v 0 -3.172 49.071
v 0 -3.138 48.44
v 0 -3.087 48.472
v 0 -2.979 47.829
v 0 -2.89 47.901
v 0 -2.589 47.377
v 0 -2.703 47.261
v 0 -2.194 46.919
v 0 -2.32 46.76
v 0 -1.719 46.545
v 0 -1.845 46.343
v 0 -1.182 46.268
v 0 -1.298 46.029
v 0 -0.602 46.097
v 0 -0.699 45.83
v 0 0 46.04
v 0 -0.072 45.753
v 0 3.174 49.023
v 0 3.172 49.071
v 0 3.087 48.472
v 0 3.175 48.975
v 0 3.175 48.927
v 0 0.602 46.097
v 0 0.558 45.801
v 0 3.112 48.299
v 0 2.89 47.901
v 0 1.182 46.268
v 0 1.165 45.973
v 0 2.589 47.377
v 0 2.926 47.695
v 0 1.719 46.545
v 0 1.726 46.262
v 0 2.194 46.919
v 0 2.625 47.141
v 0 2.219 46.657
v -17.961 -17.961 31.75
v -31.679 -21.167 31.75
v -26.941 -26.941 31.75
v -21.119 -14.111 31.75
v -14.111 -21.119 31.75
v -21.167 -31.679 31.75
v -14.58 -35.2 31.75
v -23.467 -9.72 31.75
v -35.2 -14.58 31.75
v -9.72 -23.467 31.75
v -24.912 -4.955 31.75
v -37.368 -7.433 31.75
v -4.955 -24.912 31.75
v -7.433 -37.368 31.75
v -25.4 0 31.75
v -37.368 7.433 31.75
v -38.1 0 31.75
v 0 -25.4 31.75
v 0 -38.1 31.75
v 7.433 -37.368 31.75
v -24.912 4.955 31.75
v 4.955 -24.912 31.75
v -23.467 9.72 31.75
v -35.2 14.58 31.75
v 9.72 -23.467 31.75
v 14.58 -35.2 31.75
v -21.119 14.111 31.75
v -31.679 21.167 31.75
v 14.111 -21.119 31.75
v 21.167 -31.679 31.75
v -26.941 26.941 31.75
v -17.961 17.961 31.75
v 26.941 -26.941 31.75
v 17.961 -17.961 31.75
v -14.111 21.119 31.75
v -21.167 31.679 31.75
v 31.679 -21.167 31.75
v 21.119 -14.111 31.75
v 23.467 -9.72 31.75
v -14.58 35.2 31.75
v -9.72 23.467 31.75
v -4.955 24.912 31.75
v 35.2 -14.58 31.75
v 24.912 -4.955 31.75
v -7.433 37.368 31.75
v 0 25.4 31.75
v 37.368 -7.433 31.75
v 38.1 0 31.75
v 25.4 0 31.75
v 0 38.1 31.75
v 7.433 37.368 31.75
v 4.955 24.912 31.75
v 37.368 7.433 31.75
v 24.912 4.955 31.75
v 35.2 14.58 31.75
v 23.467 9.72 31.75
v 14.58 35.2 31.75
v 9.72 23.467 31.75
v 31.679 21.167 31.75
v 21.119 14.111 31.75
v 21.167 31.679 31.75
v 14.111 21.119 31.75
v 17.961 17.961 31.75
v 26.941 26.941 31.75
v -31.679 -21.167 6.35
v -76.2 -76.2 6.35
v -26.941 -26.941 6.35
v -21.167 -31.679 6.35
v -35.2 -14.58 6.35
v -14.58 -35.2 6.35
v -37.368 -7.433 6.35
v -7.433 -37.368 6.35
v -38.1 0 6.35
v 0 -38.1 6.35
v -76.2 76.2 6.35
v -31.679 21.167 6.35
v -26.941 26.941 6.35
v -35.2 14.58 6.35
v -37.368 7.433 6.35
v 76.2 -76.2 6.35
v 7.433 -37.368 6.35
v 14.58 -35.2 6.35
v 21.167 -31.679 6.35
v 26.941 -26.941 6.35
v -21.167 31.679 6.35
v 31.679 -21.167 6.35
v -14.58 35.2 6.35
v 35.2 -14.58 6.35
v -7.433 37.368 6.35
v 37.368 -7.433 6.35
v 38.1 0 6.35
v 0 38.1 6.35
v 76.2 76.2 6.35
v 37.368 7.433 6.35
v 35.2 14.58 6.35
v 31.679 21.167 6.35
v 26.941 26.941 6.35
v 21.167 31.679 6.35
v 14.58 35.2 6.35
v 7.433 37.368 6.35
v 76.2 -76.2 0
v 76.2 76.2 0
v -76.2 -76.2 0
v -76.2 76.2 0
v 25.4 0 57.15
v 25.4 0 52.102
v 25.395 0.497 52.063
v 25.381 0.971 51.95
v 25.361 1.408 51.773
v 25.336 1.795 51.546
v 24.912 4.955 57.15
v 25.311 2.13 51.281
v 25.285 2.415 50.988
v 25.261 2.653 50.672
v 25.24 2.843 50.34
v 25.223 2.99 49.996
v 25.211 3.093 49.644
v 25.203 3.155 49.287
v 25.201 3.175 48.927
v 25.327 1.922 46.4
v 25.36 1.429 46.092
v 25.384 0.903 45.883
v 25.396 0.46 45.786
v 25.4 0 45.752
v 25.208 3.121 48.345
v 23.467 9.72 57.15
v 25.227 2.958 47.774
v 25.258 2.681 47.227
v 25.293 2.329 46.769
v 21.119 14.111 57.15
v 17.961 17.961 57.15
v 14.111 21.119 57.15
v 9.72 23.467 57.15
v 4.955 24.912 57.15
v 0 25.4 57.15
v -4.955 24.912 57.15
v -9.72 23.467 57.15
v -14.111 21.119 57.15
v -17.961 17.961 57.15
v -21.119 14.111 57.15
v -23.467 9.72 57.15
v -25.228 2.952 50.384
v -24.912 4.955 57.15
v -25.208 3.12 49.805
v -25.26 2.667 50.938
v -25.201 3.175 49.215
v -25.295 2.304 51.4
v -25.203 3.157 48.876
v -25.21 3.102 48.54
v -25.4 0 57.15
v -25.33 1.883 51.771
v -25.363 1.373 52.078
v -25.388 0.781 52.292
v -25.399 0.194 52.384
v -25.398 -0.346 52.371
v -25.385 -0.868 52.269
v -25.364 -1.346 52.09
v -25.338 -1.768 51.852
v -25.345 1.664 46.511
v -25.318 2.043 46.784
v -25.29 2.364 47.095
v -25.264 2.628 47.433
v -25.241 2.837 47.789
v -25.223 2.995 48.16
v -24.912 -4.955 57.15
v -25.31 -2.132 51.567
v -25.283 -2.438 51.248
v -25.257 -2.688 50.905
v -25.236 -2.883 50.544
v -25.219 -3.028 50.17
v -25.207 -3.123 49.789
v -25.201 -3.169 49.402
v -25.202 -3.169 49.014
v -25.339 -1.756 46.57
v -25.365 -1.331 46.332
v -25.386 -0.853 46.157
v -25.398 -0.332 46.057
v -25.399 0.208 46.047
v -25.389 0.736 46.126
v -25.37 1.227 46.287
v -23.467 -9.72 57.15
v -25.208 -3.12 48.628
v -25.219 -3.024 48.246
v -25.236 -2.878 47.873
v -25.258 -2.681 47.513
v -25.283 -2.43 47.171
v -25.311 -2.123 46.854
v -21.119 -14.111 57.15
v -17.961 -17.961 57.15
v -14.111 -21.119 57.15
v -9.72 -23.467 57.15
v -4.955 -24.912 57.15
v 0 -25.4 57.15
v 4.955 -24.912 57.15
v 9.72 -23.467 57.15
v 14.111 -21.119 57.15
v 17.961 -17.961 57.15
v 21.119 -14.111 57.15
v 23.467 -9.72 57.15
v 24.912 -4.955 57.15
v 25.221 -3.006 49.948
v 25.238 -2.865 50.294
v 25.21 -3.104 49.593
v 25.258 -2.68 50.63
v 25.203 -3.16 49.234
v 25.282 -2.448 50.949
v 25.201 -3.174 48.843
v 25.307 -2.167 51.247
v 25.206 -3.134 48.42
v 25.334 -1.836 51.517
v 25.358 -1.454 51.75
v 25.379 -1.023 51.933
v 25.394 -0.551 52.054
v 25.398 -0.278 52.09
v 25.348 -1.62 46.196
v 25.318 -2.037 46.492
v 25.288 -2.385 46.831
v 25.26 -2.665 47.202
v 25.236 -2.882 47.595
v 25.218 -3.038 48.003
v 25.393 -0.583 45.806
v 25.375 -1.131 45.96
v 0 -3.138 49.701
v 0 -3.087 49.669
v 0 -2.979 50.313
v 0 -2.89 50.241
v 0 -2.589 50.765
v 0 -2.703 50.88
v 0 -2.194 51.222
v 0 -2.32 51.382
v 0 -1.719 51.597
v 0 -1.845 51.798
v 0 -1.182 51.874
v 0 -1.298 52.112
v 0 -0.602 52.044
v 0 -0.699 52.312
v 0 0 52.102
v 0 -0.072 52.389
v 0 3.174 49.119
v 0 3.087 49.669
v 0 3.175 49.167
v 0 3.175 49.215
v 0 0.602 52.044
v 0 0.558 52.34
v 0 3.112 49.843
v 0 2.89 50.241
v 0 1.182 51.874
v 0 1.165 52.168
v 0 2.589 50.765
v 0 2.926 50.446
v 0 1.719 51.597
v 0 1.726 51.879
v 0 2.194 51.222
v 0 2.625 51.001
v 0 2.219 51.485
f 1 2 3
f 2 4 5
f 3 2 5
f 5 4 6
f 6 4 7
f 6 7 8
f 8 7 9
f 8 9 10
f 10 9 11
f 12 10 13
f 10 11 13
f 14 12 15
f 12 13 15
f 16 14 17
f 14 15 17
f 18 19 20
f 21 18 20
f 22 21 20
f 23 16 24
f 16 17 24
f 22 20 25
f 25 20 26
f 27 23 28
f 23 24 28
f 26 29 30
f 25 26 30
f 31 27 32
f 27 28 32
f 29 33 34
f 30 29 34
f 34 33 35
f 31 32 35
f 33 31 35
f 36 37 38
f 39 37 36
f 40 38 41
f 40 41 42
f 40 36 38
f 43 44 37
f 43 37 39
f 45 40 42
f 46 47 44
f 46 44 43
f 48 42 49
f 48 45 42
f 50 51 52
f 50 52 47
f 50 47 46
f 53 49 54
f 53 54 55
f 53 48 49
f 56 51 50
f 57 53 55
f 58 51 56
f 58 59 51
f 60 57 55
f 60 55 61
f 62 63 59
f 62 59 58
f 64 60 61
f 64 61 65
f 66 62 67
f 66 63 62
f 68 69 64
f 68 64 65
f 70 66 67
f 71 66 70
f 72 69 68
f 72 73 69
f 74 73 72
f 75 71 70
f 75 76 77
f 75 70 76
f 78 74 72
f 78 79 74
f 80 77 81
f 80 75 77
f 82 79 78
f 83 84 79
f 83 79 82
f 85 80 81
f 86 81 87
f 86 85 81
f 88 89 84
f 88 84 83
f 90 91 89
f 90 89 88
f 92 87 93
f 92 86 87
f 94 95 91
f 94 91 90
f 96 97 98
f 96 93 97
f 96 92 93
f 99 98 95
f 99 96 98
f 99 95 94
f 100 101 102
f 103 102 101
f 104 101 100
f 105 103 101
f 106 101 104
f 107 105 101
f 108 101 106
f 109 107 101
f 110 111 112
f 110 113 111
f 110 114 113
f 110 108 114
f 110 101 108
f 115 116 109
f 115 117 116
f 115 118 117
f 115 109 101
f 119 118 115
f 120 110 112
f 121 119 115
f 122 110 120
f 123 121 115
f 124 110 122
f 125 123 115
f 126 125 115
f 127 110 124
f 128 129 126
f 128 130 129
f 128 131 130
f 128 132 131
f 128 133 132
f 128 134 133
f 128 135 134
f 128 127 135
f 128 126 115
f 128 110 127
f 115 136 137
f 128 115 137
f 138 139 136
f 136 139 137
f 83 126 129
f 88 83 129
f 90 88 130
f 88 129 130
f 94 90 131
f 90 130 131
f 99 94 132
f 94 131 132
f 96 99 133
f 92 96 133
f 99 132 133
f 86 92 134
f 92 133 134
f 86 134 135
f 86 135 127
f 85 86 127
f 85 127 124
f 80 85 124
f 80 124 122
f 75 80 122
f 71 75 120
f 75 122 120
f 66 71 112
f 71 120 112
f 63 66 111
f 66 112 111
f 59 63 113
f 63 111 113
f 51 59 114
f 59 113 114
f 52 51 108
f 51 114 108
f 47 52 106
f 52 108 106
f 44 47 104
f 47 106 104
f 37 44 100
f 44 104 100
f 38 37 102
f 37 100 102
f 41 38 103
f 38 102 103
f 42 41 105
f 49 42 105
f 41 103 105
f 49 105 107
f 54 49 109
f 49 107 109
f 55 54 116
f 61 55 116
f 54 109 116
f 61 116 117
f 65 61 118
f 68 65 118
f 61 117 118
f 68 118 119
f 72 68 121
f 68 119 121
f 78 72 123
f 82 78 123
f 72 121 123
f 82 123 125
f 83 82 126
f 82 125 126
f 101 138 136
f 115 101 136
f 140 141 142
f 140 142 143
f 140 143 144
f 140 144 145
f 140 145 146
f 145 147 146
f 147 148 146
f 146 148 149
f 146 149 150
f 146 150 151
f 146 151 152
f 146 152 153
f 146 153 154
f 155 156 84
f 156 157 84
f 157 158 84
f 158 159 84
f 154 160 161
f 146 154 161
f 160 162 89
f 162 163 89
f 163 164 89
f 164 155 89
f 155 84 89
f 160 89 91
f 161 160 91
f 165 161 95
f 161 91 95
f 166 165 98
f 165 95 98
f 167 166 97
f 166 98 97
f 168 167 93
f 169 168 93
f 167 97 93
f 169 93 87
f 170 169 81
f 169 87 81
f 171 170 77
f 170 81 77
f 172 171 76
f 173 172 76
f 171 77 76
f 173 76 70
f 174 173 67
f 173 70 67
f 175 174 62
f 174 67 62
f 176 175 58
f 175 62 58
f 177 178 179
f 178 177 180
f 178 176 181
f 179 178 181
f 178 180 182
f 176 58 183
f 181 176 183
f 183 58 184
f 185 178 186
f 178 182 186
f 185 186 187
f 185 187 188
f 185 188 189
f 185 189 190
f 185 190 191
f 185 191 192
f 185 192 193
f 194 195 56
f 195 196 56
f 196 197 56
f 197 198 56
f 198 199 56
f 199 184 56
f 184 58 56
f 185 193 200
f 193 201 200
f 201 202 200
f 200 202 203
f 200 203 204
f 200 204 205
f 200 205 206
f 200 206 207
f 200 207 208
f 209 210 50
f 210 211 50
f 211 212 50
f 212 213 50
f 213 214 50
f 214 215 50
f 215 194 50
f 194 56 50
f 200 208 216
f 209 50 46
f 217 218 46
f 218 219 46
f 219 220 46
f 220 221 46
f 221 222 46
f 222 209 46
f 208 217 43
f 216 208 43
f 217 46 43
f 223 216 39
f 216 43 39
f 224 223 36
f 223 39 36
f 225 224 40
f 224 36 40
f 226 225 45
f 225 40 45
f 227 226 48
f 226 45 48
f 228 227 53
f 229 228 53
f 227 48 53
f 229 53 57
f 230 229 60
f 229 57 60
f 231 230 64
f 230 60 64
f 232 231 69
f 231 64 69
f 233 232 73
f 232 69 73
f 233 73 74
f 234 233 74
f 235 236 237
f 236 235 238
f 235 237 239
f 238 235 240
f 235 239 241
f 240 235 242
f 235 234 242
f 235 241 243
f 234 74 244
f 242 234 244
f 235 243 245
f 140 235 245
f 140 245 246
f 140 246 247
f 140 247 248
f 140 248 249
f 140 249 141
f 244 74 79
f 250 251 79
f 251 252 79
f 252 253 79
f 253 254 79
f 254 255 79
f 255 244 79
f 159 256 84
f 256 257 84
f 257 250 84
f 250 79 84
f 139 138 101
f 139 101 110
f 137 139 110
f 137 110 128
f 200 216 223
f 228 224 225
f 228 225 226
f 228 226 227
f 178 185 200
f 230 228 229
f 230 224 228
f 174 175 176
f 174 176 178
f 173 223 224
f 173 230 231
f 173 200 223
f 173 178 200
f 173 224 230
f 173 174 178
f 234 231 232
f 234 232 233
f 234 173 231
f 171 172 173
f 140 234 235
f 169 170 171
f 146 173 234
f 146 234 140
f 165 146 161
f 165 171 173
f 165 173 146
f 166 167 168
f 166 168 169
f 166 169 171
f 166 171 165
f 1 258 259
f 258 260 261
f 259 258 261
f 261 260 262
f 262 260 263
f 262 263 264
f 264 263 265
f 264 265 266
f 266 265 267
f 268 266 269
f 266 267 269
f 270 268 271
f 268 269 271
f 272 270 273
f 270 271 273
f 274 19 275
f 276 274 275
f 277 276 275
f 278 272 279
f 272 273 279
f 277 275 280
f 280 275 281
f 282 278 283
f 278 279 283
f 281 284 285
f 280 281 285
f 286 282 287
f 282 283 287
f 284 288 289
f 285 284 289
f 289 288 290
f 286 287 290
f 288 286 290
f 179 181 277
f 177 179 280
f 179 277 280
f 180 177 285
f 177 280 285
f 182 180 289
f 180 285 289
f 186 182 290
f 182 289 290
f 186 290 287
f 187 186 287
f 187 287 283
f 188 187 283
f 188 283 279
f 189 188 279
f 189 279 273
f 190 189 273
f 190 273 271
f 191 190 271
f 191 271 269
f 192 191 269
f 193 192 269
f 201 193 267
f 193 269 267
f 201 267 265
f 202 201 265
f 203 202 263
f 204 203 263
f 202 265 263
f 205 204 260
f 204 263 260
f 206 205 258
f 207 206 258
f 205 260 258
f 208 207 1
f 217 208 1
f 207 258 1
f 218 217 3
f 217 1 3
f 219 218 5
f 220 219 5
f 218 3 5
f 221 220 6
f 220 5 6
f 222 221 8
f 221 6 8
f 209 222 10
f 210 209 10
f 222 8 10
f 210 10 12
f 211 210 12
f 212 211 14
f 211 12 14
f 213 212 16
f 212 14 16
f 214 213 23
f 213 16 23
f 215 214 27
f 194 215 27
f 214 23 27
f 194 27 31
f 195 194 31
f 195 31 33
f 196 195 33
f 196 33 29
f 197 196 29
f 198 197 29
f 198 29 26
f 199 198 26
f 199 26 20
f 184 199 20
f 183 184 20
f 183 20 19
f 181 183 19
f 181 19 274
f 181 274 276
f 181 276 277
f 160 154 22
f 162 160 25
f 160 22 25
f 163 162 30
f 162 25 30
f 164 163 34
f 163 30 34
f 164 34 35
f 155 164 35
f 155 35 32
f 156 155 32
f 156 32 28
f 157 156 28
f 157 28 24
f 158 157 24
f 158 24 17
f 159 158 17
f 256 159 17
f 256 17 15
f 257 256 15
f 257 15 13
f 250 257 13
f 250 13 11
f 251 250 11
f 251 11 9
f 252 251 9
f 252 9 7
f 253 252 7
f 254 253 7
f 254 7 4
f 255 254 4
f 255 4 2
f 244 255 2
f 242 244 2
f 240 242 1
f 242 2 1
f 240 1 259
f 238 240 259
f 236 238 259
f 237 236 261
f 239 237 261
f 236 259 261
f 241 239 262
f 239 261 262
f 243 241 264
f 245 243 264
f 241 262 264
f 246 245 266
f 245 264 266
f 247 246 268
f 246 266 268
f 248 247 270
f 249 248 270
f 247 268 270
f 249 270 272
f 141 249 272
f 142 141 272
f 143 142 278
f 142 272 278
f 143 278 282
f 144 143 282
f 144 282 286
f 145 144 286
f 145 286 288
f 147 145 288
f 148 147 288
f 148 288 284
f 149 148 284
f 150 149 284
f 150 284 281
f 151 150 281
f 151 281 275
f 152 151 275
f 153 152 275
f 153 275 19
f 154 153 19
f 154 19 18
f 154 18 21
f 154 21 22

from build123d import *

# Parameters (mm, degrees)
F0_W     = 152.4
F0_H     = 152.4
F1_DEPTH = 6.35
F2_R     = 38.1
F3_DEPTH = 25.4
F4_R     = 25.4
F5_DEPTH = 25.4
F7_D     = 6.35
F7_DEPTH = 76.201
F9_D     = 6.35
F9_DEPTH = 76.201


with BuildPart() as f1:
    # F0 (on Top) → F1 (new body)
    with BuildSketch(Plane.XY):
        Rectangle(F0_W, F0_H)
    extrude(amount=F1_DEPTH)

    # F2 (on face) → F3 (join)
    with BuildSketch(Plane.XY.offset(6.35)):
        Circle(F2_R)
    extrude(amount=F3_DEPTH)

    # F4 (on face) → F5 (join)
    with BuildSketch(Plane.XY.offset(31.75)):
        Circle(F4_R)
    extrude(amount=F5_DEPTH)

    # F7 (through all, one way)
    with BuildSketch(Plane(origin=(0, 0, 0), x_dir=(0, 1, 0), z_dir=(-1, 0, 0))):
        with Locations((0, -48.9269793034)):
            Circle(F7_D / 2)
    extrude(amount=-F7_DEPTH, mode=Mode.SUBTRACT)

    # F9 (through all, one way)
    with BuildSketch(Plane.YZ):
        with Locations((0, 49.2147840559)):
            Circle(F9_D / 2)
    extrude(amount=-F9_DEPTH, mode=Mode.SUBTRACT)


solid = f1.part
